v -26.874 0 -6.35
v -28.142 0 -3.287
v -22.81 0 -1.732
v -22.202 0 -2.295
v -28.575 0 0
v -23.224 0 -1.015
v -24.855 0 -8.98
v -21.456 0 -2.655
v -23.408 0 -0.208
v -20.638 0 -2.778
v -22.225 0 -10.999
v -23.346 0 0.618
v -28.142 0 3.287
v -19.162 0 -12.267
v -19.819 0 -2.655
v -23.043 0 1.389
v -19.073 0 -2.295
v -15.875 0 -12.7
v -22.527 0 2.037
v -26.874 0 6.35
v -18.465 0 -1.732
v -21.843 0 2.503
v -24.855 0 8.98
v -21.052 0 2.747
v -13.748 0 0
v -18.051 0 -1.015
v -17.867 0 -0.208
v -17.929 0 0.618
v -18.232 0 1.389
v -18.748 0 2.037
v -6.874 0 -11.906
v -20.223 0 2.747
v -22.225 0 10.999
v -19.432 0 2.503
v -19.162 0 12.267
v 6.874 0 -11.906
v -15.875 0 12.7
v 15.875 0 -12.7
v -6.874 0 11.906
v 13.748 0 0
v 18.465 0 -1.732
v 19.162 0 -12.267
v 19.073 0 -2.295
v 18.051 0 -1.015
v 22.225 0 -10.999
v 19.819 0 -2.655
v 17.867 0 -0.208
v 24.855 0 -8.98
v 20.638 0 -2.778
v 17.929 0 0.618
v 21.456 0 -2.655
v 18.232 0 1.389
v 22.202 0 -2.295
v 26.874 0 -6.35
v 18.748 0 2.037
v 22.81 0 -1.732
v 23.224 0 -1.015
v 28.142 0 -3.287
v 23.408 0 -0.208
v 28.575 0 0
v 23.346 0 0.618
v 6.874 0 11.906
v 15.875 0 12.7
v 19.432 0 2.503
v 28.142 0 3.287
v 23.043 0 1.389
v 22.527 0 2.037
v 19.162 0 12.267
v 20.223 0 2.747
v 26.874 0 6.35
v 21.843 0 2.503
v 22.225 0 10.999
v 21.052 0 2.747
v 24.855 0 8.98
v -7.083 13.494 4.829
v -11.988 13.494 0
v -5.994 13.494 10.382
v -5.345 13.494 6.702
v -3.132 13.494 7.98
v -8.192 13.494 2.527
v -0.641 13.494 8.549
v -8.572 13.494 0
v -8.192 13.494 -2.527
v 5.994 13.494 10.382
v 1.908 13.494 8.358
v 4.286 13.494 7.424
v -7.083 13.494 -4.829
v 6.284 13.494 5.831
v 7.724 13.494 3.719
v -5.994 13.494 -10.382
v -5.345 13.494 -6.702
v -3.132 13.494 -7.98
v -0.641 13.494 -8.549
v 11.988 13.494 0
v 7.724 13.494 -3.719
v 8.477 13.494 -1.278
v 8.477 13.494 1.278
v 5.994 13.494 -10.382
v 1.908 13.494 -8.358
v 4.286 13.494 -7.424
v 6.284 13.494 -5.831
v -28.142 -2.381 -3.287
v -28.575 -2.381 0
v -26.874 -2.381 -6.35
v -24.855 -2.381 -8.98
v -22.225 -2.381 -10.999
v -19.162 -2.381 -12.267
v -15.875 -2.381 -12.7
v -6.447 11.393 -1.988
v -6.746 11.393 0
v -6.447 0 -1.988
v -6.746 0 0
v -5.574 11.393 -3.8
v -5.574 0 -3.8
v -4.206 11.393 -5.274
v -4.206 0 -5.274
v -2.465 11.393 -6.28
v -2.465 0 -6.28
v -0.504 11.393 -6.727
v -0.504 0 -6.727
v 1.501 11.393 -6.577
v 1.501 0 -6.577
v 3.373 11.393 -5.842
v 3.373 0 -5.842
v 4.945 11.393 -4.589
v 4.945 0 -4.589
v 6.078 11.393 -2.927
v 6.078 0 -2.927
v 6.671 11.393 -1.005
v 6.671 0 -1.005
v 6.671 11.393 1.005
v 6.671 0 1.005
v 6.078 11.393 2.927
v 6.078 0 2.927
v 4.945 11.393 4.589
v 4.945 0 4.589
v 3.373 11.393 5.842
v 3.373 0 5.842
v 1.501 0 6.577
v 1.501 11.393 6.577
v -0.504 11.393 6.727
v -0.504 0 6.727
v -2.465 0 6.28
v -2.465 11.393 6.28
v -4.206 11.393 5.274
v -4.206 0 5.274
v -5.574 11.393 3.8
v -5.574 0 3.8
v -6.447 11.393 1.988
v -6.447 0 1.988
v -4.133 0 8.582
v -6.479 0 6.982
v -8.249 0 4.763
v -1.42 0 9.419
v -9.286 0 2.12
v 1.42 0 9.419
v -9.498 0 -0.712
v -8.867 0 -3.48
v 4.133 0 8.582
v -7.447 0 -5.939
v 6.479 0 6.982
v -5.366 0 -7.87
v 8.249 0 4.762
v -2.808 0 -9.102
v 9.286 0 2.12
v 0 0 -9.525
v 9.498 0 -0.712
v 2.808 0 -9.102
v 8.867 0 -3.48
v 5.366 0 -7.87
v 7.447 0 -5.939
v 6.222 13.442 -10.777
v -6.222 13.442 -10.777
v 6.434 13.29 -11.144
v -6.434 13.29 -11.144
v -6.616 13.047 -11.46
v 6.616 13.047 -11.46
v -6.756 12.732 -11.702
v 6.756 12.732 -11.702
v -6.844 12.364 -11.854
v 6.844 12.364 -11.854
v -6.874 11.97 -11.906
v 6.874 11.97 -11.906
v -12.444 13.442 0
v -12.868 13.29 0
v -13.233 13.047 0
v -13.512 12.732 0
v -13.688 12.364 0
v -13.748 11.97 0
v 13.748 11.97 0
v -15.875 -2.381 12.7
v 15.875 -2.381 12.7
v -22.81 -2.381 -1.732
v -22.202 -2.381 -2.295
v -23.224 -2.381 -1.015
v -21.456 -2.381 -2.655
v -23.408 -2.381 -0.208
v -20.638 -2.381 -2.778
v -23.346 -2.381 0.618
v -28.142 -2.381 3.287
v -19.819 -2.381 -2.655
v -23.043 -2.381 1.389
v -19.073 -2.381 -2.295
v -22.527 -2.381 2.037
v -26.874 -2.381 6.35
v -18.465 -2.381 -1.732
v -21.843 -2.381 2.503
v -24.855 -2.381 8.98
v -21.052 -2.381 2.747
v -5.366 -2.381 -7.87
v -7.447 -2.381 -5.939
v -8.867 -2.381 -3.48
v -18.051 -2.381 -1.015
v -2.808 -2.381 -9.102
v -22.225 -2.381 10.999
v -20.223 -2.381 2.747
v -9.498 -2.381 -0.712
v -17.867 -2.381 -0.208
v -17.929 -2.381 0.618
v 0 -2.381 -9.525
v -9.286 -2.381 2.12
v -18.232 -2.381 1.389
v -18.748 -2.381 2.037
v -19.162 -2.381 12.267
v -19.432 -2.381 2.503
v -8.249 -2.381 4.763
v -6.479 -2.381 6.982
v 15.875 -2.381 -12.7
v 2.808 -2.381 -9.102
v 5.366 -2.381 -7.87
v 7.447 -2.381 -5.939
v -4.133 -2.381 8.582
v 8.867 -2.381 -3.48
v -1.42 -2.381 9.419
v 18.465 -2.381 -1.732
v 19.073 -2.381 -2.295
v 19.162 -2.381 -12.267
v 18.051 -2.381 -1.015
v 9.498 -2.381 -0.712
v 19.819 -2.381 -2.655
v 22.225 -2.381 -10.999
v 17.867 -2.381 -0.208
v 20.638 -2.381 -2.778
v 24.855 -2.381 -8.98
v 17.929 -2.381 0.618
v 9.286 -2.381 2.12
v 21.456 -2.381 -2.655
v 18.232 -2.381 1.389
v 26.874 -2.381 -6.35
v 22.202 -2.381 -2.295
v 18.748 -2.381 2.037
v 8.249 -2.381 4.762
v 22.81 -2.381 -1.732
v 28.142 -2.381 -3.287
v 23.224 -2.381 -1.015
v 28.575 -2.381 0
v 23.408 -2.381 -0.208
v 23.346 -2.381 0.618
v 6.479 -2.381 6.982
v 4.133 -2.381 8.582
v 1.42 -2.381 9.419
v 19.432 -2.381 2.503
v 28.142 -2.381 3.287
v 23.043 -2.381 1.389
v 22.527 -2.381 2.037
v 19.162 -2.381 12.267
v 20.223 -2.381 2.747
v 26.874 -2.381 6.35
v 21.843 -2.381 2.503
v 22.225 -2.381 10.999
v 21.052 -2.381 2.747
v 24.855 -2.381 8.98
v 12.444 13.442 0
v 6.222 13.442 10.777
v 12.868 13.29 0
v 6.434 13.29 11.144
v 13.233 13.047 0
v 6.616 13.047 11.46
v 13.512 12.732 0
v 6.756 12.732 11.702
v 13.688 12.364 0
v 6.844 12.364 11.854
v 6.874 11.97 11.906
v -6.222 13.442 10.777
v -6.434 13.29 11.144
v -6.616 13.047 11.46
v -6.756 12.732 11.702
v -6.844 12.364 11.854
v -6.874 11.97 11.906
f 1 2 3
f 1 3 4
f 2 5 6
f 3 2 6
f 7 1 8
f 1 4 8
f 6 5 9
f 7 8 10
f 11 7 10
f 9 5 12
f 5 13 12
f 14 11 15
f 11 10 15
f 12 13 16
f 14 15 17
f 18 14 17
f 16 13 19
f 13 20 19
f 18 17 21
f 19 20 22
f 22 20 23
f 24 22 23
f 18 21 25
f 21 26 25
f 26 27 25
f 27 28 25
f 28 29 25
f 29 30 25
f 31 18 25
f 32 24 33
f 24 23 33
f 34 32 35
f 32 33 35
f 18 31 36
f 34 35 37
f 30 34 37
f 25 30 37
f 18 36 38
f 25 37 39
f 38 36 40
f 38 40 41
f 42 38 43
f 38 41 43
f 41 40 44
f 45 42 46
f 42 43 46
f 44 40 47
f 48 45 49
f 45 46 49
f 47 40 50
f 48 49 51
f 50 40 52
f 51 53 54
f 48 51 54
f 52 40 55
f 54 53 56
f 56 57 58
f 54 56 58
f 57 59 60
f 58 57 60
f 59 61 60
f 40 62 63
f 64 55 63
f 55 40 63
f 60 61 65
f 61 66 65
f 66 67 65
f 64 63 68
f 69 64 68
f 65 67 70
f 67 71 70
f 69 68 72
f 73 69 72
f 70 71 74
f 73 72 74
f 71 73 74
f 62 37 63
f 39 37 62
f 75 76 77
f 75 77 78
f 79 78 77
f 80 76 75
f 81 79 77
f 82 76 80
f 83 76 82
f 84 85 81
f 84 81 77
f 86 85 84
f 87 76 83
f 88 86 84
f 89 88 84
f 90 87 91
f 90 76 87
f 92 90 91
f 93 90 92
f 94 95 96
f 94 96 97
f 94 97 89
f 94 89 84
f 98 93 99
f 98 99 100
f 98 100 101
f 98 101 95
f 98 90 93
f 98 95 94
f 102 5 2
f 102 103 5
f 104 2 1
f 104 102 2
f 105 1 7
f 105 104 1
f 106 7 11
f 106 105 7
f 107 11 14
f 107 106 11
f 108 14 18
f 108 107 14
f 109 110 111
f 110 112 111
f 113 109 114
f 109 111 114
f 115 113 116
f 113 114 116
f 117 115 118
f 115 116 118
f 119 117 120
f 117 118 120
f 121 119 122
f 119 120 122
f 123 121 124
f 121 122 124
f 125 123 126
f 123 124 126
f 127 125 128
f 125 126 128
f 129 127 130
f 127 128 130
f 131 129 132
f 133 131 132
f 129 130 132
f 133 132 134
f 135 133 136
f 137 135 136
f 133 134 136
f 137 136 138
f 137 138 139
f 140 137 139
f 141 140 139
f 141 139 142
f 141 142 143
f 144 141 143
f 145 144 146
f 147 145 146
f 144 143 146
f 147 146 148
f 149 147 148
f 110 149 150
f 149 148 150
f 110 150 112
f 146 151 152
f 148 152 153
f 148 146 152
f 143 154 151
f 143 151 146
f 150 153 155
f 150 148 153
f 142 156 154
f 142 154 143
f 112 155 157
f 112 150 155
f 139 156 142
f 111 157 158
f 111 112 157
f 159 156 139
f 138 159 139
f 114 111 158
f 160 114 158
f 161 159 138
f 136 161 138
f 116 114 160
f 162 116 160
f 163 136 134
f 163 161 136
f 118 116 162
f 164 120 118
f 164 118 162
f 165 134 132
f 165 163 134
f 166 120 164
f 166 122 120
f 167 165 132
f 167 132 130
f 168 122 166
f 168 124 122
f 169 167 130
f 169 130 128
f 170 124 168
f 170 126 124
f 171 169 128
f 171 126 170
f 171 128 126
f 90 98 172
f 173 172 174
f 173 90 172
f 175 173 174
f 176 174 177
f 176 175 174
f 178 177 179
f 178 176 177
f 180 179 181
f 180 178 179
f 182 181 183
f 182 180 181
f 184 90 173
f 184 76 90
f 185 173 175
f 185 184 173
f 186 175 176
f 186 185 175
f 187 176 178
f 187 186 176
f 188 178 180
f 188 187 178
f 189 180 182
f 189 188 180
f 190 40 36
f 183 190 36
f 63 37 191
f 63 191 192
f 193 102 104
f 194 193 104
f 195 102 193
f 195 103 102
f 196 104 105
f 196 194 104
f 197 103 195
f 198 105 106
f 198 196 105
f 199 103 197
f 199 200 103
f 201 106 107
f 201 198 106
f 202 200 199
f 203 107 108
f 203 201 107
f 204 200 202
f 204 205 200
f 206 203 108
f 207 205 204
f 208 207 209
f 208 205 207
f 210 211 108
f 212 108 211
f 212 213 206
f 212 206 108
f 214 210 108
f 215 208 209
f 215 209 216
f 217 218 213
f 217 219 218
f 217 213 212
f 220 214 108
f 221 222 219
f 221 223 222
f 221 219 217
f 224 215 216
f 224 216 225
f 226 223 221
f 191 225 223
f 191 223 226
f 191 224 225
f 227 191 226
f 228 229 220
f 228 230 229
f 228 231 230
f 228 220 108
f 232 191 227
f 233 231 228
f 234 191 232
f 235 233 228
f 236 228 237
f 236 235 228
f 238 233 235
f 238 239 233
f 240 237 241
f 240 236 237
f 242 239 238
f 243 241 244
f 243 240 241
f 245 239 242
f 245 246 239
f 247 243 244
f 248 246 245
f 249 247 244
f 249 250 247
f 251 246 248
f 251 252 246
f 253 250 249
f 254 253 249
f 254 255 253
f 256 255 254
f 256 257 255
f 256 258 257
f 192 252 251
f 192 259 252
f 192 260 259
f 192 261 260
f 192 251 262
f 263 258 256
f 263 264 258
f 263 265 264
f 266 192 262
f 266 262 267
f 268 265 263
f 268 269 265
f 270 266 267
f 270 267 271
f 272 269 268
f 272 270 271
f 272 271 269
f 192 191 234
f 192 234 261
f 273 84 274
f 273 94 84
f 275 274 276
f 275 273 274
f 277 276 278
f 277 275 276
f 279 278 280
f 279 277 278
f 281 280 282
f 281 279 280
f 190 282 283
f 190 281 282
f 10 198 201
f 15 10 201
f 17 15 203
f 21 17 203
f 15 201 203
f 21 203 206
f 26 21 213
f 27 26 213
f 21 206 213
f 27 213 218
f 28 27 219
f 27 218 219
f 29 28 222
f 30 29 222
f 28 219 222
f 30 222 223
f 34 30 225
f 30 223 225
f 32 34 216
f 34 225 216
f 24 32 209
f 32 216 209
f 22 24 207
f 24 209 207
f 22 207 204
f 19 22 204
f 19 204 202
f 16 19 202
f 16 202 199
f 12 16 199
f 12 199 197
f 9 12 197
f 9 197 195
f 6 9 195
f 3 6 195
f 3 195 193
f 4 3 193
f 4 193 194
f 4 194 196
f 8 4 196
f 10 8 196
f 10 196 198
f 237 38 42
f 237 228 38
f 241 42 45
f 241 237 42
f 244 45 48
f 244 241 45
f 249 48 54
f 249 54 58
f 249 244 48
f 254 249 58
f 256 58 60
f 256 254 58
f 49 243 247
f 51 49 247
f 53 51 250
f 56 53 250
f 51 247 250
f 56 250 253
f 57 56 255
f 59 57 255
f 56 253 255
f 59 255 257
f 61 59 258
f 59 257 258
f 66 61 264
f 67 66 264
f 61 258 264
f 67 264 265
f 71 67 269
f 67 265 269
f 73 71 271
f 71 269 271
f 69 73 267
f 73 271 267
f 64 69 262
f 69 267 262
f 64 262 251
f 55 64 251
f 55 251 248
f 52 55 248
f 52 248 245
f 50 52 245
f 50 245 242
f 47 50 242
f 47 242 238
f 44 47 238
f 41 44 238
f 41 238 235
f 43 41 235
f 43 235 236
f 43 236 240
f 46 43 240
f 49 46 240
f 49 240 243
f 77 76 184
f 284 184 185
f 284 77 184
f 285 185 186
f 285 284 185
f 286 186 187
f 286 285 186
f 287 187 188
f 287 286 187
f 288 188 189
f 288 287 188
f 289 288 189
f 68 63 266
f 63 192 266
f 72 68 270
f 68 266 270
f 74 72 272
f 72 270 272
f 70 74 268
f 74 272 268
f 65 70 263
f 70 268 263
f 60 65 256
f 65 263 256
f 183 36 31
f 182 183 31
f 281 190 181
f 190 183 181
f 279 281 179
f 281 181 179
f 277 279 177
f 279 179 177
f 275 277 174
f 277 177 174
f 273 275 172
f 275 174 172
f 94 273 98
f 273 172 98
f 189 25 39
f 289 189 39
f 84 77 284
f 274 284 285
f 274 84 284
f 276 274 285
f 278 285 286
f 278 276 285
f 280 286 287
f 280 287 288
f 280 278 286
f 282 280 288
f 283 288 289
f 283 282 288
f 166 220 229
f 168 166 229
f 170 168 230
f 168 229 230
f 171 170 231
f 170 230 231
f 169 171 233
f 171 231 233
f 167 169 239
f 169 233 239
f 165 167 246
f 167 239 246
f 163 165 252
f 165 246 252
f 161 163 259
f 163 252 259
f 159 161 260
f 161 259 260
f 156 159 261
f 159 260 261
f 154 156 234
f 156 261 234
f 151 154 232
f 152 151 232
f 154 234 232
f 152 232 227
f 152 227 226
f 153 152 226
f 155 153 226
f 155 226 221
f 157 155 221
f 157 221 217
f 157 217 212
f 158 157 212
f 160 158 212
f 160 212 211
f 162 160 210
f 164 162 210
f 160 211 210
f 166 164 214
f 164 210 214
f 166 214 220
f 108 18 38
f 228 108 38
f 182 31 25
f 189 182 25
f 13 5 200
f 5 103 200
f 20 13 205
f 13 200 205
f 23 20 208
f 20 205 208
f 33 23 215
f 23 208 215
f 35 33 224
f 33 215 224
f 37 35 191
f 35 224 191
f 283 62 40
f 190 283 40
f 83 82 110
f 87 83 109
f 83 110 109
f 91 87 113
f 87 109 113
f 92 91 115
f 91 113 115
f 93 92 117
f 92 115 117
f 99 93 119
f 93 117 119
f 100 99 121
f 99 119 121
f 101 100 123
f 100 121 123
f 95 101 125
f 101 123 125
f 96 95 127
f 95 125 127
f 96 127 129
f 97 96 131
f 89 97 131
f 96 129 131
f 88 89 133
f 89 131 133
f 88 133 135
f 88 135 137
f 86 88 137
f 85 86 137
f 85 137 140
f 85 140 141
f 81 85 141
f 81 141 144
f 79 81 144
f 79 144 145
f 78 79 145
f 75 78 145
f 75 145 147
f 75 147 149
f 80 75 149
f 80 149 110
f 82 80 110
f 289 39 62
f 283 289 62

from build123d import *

# Parameters (mm, degrees)
BOSS_EXTRUDE1_DEPTH               = 13.49375
F_5_8_11_TAPPED_HOLE1_D           = 13.49248
F_5_8_11_TAPPED_HOLE1_CSINK_D     = 17.145
F_5_8_11_TAPPED_HOLE1_CSINK_ANGLE = 82
FILLET1_R                         = 1.524
SKETCH4_W                         = 57.15
SKETCH4_H                         = 25.4
BOSS_EXTRUDE2_DEPTH               = 2.38125
FILLET2_R                         = 12.7
SKETCH5_R                         = 9.525
CUT_EXTRUDE1_DEPTH                = 2.38125
SKETCH6_R                         = 2.778125
CUT_EXTRUDE2_DEPTH                = 36.06902123


with BuildPart() as part:
    # Sketch1 → Boss-Extrude1 (new body)
    with BuildSketch(Plane(origin=(0, 0, 0), x_dir=(1, 0, 0), z_dir=(0, 1, 0))):
        Polygon((13.748153285, 0), (6.874076643, 11.90625), (-6.874076643, 11.90625), (-13.748153285, 0), (-6.874076643, -11.90625), (6.874076643, -11.90625), align=None)
    extrude(amount=BOSS_EXTRUDE1_DEPTH)

    # 5/8-11 Tapped Hole1 (through all)
    with Locations(Plane(origin=(0, 13.49375, 0), x_dir=(1, 0, 0), z_dir=(0, 1, 0))):
        with Locations((0, 0)):
            CounterSinkHole(F_5_8_11_TAPPED_HOLE1_D / 2, F_5_8_11_TAPPED_HOLE1_CSINK_D / 2, counter_sink_angle=F_5_8_11_TAPPED_HOLE1_CSINK_ANGLE)

    # Fillet1
    fillet1_edges = [part.edges().sort_by_distance(p)[0] for p in [
        (0, 13.49375, -11.90625),
        (-10.311114964, 13.49375, -5.953125),
        (-10.311114964, 13.49375, 5.953125),
        (0, 13.49375, 11.90625),
        (10.311114964, 13.49375, 5.953125),
        (10.311114964, 13.49375, -5.953125),
    ]]
    fillet(fillet1_edges, radius=FILLET1_R)

    # Sketch4 → Boss-Extrude2 (add)
    with BuildSketch(Plane.XZ):
        Rectangle(SKETCH4_W, SKETCH4_H)
    extrude(amount=BOSS_EXTRUDE2_DEPTH)

    # Fillet2
    fillet2_edges = [part.edges().sort_by_distance(p)[0] for p in [
        (-28.575, -1.190625, -12.7),
        (-28.575, -1.190625, 12.7),
        (28.575, -1.190625, -12.7),
        (28.575, -1.190625, 12.7),
    ]]
    fillet(fillet2_edges, radius=FILLET2_R - 0.0001)  # a hair under: the kernel refuses the full size

    # Sketch5 → Cut-Extrude1 (cut)
    with BuildSketch(Plane.XZ.offset(2.38125)):
        with Locations(Location((0, 0, 0), (0, 0, 270))):
            Circle(SKETCH5_R)
    extrude(amount=-CUT_EXTRUDE1_DEPTH, mode=Mode.SUBTRACT)

    # Sketch6 → Cut-Extrude2 (cut, through all)
    with BuildSketch(Plane.XZ.offset(2.38125)):
        with Locations(Location((-20.6375, 0, 0), (0, 0, 270))):
            Circle(SKETCH6_R)
        with Locations(Location((20.6375, 0, 0), (0, 0, 270))):
            Circle(SKETCH6_R)
    extrude(amount=-CUT_EXTRUDE2_DEPTH, mode=Mode.SUBTRACT)


solid = part.part
